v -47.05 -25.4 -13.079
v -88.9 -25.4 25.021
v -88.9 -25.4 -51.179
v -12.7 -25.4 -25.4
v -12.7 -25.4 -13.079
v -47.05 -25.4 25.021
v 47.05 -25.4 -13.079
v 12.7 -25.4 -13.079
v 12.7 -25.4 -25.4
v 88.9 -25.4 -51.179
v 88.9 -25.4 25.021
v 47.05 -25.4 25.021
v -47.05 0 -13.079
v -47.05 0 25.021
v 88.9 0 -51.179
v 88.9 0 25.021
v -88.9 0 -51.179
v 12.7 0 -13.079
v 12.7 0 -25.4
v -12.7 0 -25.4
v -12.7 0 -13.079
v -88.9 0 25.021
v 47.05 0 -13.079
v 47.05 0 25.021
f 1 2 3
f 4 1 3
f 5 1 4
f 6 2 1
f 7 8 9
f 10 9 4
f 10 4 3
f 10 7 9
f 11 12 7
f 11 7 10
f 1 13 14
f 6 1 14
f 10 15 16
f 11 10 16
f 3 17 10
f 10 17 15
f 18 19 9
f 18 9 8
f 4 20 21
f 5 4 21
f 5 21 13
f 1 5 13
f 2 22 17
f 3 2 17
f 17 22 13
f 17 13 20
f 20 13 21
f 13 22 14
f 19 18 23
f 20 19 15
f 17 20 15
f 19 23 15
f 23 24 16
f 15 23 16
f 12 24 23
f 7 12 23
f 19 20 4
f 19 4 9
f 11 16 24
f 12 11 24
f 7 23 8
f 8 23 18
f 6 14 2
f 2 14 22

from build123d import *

# Parameters (mm, degrees)
F1_DEPTH = 25.4
F2_W     = 25.4
F2_H     = 12.321454
F3_DEPTH = 4
F4_DEPTH = 25.401


with BuildPart() as f1:
    # F0 (on Front) → F1 (new body)
    with BuildSketch(Plane.XZ):
        Polygon((-47.05, 25.021454), (-88.9, 25.021454), (-88.9, -30.673691), (-88.9, -51.178546), (-41.565981, -51.178546), (0, -51.178546), (88.9, -51.178546), (88.9, 25.021454), (47.05, 25.021454), (47.05, -13.078546), (0, -13.078546), (-47.05, -13.078546), align=None)
    extrude(amount=F1_DEPTH)

    # F2 (on Front) → F3 (cut)
    with BuildSketch(Plane.XZ):
        with Locations((0, -19.239273)):
            Rectangle(F2_W, F2_H)
    extrude(amount=F3_DEPTH, mode=Mode.SUBTRACT)

    # F2 (on Front) → F4 (cut, through all)
    with BuildSketch(Plane.XZ):
        with Locations((0, -19.239273)):
            Rectangle(F2_W, F2_H)
    extrude(amount=F4_DEPTH, mode=Mode.SUBTRACT)


solid = f1.part
